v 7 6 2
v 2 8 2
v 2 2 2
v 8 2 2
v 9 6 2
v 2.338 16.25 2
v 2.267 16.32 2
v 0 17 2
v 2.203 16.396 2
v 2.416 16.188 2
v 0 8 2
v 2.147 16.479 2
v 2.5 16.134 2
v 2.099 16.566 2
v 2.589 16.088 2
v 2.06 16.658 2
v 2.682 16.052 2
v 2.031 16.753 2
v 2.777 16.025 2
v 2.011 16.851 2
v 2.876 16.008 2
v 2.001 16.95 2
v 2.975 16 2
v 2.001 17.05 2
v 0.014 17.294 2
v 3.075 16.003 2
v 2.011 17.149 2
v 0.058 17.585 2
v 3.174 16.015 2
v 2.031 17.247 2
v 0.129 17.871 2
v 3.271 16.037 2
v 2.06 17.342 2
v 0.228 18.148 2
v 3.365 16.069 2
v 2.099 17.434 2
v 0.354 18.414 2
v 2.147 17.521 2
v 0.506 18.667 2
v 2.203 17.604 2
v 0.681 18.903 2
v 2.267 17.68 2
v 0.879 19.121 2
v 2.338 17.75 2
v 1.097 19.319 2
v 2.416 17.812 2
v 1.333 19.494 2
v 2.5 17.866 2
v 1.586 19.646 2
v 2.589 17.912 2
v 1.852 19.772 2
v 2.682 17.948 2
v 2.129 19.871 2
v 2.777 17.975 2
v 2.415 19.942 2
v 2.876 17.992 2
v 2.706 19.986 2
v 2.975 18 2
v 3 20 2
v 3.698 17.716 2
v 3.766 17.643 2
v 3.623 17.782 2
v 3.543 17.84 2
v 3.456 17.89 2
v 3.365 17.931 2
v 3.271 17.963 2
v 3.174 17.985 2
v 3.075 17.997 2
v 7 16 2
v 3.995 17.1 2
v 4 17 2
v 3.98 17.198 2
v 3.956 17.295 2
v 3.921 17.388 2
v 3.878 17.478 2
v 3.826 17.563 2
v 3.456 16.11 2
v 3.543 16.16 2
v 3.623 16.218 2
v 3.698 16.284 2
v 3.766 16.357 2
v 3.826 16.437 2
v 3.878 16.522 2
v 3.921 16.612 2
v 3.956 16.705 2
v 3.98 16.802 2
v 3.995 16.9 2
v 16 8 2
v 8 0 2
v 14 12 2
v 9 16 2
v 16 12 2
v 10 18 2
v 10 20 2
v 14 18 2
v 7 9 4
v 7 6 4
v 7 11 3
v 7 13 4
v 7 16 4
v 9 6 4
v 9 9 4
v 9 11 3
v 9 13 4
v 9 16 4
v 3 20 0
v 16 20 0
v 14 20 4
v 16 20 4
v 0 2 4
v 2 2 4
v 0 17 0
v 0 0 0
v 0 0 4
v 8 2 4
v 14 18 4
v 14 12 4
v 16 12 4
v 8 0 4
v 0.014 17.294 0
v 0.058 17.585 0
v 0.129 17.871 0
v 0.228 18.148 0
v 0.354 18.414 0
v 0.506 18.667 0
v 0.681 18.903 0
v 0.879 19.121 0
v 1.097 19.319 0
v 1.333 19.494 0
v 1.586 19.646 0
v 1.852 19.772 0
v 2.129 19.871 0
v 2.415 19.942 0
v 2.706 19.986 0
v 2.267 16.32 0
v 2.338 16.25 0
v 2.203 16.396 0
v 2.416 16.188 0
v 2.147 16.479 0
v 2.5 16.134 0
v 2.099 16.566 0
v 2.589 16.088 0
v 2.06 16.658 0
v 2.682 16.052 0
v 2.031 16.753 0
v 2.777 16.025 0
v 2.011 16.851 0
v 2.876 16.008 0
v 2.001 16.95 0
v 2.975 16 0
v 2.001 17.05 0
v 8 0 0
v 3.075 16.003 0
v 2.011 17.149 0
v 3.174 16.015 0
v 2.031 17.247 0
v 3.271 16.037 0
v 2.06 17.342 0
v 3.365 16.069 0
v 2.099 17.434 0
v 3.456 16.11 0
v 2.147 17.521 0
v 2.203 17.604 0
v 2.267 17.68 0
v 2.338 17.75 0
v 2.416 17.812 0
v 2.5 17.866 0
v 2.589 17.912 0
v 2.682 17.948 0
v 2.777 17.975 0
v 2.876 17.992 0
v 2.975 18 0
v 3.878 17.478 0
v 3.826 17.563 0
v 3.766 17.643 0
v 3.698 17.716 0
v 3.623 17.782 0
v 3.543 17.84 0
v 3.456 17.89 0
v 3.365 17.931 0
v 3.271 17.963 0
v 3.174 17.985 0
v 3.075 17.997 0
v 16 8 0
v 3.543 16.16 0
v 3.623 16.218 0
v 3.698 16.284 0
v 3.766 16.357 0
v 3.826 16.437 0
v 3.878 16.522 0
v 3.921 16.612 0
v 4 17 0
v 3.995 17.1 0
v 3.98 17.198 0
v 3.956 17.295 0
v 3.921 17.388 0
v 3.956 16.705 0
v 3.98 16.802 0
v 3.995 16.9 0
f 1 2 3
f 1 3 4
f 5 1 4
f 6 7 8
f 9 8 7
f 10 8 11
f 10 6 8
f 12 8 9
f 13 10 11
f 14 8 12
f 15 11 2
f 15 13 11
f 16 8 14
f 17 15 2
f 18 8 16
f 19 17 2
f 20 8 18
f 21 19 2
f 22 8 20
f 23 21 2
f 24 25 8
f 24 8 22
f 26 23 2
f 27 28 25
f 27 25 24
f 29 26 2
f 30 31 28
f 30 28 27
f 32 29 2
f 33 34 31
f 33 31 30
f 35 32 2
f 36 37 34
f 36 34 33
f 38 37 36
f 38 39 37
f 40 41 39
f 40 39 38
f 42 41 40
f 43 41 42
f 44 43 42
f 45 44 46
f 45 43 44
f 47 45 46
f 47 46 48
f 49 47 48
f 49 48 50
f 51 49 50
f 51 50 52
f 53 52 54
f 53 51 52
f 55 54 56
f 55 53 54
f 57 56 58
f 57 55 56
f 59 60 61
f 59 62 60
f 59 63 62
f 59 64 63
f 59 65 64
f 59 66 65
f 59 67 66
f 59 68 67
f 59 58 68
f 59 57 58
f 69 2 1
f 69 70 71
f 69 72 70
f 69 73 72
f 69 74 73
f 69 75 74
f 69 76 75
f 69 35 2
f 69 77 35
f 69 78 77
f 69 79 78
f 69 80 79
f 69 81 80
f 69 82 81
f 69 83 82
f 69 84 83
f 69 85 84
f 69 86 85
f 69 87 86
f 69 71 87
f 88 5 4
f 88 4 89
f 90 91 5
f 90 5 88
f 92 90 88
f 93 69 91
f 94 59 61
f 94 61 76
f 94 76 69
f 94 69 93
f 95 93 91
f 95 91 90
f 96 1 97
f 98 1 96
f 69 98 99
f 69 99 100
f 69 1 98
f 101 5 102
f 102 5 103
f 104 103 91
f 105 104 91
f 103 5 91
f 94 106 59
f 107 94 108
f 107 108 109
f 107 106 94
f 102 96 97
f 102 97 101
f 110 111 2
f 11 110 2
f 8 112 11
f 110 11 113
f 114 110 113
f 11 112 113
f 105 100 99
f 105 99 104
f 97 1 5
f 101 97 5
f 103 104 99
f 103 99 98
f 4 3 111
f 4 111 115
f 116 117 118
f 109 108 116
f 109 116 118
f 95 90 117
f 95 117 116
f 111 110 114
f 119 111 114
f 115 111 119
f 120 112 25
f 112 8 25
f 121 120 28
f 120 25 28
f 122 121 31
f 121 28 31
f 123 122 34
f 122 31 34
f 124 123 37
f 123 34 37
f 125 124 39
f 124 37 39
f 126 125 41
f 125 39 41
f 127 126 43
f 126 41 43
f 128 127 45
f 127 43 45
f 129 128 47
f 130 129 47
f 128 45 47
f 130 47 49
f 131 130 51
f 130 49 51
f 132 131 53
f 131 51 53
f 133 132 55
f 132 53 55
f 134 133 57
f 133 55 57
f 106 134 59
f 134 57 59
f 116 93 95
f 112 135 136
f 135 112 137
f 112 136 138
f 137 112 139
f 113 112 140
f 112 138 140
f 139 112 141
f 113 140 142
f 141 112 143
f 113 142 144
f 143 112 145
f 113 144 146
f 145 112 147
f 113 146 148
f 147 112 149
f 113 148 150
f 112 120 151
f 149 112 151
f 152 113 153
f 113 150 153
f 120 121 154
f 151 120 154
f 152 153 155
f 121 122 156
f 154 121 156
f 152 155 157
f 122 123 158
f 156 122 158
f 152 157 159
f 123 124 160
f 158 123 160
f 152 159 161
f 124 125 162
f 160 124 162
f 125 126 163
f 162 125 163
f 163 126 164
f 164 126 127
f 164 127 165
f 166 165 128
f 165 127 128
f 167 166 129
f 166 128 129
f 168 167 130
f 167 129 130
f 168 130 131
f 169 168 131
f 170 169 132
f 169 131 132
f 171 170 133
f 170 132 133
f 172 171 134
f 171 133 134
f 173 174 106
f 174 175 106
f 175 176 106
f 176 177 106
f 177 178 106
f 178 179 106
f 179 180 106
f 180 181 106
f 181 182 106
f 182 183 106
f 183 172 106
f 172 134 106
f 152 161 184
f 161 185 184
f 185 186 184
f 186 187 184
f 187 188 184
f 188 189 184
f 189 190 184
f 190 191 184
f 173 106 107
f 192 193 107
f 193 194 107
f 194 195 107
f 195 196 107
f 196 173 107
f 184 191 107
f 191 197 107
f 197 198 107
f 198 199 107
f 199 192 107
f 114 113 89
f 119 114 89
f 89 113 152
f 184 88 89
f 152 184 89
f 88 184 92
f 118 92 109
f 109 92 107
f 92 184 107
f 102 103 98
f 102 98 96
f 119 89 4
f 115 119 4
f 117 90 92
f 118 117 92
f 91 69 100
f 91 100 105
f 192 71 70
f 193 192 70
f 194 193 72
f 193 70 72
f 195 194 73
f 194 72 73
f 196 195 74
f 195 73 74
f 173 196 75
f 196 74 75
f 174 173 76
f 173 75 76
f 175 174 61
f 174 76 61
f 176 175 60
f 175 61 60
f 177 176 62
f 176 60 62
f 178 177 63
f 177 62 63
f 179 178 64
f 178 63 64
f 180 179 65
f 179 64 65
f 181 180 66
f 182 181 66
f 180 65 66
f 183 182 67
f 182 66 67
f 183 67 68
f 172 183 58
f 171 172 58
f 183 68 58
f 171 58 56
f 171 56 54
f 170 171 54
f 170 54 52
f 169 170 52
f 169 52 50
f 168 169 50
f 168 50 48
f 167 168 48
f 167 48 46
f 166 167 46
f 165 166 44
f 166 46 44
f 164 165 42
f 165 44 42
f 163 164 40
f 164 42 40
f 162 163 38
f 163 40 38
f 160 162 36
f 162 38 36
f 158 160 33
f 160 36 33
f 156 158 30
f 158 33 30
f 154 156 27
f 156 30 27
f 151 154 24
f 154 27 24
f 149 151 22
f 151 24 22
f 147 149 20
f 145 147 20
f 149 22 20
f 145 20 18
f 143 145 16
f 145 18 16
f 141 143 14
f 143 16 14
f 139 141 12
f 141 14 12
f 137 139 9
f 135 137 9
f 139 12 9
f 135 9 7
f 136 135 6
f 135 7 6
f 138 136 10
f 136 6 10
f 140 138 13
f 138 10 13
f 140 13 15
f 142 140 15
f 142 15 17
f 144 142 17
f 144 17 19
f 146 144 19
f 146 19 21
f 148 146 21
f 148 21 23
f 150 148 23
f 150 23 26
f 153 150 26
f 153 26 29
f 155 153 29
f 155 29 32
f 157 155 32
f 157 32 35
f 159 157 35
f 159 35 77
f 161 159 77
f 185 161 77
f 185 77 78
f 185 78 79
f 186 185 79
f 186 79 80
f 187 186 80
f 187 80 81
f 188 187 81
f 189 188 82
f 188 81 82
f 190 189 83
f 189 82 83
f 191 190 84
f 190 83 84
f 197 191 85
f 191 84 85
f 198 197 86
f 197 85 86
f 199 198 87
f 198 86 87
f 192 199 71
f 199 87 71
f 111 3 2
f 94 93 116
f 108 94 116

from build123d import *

# Parameters (mm, degrees)
SKETCH_W        = 16
SKETCH_H        = 20
PAD_DEPTH       = 2
POCKET_DEPTH    = 2
SKETCH002_W     = 8
SKETCH002_H     = 2
SKETCH002_W_2   = 2
SKETCH002_H_2   = 8
SKETCH002_W_3   = 4
SKETCH002_H_3   = 6
PAD001_DEPTH    = 2
POCKET001_DEPTH = 2
POCKET002_DEPTH = 2
FILLET_R        = 3
SKETCH005_R     = 1
POCKET003_DEPTH = 2
SKETCH006_W     = 2
SKETCH006_H     = 10
PAD002_DEPTH    = 2
POCKET004_DEPTH = 2


with BuildPart() as part:
    # Sketch → Pad (new body)
    with BuildSketch(Plane.XY):
        with Locations((8, 10)):
            Rectangle(SKETCH_W, SKETCH_H)
    extrude(amount=PAD_DEPTH)

    # Sketch001 (on Face6 of Pad) → Pocket (cut)
    with BuildSketch(Plane.XY.offset(2)):
        Polygon((8, 0), (16, 0), (16, 8), align=None)
    extrude(amount=-POCKET_DEPTH, mode=Mode.SUBTRACT)

    # Sketch002 (on Face4 of Pocket) → Pad001 (join)
    with BuildSketch(Plane.XY.offset(2)):
        with Locations((4, 1)):
            Rectangle(SKETCH002_W, SKETCH002_H)
        with Locations((15, 16)):
            Rectangle(SKETCH002_W_2, SKETCH002_H_2)
        with Locations((12, 19)):
            Rectangle(SKETCH002_W_3, SKETCH002_H)
        with Locations((1, 5)):
            Rectangle(SKETCH002_W_2, SKETCH002_H_3)
    extrude(amount=PAD001_DEPTH)

    # Sketch003 (on Face17 of Pad001) → Pocket001 (cut)
    with BuildSketch(Plane.XZ.offset(-18)):
        Polygon((10, 2), (14, 4), (10, 4), align=None)
    extrude(amount=-POCKET001_DEPTH, mode=Mode.SUBTRACT)

    # Sketch004 (on Face21 of Pocket001) → Pocket002 (cut)
    with BuildSketch(Plane.YZ.offset(2)):
        Polygon((2, 4), (8, 2), (8, 4), align=None)
    extrude(amount=-POCKET002_DEPTH, mode=Mode.SUBTRACT)

    # Fillet
    fillet_edges = [part.edges().sort_by_distance(p)[0] for p in [
        (0, 20, 1),
    ]]
    fillet(fillet_edges, radius=FILLET_R)

    # Sketch005 (on Face8 of Fillet) → Pocket003 (cut)
    with BuildSketch(Plane.XY.offset(2)):
        with Locations((3, 17)):
            Circle(SKETCH005_R)
    extrude(amount=-POCKET003_DEPTH, mode=Mode.SUBTRACT)

    # Sketch006 (on Face9 of Pocket003) → Pad002 (join)
    with BuildSketch(Plane.XY.offset(2)):
        with Locations((8, 11)):
            Rectangle(SKETCH006_W, SKETCH006_H)
    extrude(amount=PAD002_DEPTH)

    # Sketch007 (on Face25 of Pad002) → Pocket004 (cut)
    with BuildSketch(Plane.YZ.offset(9)):
        Polygon((9, 4), (13, 4), (11, 3), align=None)
    extrude(amount=-POCKET004_DEPTH, mode=Mode.SUBTRACT)


solid = part.part
